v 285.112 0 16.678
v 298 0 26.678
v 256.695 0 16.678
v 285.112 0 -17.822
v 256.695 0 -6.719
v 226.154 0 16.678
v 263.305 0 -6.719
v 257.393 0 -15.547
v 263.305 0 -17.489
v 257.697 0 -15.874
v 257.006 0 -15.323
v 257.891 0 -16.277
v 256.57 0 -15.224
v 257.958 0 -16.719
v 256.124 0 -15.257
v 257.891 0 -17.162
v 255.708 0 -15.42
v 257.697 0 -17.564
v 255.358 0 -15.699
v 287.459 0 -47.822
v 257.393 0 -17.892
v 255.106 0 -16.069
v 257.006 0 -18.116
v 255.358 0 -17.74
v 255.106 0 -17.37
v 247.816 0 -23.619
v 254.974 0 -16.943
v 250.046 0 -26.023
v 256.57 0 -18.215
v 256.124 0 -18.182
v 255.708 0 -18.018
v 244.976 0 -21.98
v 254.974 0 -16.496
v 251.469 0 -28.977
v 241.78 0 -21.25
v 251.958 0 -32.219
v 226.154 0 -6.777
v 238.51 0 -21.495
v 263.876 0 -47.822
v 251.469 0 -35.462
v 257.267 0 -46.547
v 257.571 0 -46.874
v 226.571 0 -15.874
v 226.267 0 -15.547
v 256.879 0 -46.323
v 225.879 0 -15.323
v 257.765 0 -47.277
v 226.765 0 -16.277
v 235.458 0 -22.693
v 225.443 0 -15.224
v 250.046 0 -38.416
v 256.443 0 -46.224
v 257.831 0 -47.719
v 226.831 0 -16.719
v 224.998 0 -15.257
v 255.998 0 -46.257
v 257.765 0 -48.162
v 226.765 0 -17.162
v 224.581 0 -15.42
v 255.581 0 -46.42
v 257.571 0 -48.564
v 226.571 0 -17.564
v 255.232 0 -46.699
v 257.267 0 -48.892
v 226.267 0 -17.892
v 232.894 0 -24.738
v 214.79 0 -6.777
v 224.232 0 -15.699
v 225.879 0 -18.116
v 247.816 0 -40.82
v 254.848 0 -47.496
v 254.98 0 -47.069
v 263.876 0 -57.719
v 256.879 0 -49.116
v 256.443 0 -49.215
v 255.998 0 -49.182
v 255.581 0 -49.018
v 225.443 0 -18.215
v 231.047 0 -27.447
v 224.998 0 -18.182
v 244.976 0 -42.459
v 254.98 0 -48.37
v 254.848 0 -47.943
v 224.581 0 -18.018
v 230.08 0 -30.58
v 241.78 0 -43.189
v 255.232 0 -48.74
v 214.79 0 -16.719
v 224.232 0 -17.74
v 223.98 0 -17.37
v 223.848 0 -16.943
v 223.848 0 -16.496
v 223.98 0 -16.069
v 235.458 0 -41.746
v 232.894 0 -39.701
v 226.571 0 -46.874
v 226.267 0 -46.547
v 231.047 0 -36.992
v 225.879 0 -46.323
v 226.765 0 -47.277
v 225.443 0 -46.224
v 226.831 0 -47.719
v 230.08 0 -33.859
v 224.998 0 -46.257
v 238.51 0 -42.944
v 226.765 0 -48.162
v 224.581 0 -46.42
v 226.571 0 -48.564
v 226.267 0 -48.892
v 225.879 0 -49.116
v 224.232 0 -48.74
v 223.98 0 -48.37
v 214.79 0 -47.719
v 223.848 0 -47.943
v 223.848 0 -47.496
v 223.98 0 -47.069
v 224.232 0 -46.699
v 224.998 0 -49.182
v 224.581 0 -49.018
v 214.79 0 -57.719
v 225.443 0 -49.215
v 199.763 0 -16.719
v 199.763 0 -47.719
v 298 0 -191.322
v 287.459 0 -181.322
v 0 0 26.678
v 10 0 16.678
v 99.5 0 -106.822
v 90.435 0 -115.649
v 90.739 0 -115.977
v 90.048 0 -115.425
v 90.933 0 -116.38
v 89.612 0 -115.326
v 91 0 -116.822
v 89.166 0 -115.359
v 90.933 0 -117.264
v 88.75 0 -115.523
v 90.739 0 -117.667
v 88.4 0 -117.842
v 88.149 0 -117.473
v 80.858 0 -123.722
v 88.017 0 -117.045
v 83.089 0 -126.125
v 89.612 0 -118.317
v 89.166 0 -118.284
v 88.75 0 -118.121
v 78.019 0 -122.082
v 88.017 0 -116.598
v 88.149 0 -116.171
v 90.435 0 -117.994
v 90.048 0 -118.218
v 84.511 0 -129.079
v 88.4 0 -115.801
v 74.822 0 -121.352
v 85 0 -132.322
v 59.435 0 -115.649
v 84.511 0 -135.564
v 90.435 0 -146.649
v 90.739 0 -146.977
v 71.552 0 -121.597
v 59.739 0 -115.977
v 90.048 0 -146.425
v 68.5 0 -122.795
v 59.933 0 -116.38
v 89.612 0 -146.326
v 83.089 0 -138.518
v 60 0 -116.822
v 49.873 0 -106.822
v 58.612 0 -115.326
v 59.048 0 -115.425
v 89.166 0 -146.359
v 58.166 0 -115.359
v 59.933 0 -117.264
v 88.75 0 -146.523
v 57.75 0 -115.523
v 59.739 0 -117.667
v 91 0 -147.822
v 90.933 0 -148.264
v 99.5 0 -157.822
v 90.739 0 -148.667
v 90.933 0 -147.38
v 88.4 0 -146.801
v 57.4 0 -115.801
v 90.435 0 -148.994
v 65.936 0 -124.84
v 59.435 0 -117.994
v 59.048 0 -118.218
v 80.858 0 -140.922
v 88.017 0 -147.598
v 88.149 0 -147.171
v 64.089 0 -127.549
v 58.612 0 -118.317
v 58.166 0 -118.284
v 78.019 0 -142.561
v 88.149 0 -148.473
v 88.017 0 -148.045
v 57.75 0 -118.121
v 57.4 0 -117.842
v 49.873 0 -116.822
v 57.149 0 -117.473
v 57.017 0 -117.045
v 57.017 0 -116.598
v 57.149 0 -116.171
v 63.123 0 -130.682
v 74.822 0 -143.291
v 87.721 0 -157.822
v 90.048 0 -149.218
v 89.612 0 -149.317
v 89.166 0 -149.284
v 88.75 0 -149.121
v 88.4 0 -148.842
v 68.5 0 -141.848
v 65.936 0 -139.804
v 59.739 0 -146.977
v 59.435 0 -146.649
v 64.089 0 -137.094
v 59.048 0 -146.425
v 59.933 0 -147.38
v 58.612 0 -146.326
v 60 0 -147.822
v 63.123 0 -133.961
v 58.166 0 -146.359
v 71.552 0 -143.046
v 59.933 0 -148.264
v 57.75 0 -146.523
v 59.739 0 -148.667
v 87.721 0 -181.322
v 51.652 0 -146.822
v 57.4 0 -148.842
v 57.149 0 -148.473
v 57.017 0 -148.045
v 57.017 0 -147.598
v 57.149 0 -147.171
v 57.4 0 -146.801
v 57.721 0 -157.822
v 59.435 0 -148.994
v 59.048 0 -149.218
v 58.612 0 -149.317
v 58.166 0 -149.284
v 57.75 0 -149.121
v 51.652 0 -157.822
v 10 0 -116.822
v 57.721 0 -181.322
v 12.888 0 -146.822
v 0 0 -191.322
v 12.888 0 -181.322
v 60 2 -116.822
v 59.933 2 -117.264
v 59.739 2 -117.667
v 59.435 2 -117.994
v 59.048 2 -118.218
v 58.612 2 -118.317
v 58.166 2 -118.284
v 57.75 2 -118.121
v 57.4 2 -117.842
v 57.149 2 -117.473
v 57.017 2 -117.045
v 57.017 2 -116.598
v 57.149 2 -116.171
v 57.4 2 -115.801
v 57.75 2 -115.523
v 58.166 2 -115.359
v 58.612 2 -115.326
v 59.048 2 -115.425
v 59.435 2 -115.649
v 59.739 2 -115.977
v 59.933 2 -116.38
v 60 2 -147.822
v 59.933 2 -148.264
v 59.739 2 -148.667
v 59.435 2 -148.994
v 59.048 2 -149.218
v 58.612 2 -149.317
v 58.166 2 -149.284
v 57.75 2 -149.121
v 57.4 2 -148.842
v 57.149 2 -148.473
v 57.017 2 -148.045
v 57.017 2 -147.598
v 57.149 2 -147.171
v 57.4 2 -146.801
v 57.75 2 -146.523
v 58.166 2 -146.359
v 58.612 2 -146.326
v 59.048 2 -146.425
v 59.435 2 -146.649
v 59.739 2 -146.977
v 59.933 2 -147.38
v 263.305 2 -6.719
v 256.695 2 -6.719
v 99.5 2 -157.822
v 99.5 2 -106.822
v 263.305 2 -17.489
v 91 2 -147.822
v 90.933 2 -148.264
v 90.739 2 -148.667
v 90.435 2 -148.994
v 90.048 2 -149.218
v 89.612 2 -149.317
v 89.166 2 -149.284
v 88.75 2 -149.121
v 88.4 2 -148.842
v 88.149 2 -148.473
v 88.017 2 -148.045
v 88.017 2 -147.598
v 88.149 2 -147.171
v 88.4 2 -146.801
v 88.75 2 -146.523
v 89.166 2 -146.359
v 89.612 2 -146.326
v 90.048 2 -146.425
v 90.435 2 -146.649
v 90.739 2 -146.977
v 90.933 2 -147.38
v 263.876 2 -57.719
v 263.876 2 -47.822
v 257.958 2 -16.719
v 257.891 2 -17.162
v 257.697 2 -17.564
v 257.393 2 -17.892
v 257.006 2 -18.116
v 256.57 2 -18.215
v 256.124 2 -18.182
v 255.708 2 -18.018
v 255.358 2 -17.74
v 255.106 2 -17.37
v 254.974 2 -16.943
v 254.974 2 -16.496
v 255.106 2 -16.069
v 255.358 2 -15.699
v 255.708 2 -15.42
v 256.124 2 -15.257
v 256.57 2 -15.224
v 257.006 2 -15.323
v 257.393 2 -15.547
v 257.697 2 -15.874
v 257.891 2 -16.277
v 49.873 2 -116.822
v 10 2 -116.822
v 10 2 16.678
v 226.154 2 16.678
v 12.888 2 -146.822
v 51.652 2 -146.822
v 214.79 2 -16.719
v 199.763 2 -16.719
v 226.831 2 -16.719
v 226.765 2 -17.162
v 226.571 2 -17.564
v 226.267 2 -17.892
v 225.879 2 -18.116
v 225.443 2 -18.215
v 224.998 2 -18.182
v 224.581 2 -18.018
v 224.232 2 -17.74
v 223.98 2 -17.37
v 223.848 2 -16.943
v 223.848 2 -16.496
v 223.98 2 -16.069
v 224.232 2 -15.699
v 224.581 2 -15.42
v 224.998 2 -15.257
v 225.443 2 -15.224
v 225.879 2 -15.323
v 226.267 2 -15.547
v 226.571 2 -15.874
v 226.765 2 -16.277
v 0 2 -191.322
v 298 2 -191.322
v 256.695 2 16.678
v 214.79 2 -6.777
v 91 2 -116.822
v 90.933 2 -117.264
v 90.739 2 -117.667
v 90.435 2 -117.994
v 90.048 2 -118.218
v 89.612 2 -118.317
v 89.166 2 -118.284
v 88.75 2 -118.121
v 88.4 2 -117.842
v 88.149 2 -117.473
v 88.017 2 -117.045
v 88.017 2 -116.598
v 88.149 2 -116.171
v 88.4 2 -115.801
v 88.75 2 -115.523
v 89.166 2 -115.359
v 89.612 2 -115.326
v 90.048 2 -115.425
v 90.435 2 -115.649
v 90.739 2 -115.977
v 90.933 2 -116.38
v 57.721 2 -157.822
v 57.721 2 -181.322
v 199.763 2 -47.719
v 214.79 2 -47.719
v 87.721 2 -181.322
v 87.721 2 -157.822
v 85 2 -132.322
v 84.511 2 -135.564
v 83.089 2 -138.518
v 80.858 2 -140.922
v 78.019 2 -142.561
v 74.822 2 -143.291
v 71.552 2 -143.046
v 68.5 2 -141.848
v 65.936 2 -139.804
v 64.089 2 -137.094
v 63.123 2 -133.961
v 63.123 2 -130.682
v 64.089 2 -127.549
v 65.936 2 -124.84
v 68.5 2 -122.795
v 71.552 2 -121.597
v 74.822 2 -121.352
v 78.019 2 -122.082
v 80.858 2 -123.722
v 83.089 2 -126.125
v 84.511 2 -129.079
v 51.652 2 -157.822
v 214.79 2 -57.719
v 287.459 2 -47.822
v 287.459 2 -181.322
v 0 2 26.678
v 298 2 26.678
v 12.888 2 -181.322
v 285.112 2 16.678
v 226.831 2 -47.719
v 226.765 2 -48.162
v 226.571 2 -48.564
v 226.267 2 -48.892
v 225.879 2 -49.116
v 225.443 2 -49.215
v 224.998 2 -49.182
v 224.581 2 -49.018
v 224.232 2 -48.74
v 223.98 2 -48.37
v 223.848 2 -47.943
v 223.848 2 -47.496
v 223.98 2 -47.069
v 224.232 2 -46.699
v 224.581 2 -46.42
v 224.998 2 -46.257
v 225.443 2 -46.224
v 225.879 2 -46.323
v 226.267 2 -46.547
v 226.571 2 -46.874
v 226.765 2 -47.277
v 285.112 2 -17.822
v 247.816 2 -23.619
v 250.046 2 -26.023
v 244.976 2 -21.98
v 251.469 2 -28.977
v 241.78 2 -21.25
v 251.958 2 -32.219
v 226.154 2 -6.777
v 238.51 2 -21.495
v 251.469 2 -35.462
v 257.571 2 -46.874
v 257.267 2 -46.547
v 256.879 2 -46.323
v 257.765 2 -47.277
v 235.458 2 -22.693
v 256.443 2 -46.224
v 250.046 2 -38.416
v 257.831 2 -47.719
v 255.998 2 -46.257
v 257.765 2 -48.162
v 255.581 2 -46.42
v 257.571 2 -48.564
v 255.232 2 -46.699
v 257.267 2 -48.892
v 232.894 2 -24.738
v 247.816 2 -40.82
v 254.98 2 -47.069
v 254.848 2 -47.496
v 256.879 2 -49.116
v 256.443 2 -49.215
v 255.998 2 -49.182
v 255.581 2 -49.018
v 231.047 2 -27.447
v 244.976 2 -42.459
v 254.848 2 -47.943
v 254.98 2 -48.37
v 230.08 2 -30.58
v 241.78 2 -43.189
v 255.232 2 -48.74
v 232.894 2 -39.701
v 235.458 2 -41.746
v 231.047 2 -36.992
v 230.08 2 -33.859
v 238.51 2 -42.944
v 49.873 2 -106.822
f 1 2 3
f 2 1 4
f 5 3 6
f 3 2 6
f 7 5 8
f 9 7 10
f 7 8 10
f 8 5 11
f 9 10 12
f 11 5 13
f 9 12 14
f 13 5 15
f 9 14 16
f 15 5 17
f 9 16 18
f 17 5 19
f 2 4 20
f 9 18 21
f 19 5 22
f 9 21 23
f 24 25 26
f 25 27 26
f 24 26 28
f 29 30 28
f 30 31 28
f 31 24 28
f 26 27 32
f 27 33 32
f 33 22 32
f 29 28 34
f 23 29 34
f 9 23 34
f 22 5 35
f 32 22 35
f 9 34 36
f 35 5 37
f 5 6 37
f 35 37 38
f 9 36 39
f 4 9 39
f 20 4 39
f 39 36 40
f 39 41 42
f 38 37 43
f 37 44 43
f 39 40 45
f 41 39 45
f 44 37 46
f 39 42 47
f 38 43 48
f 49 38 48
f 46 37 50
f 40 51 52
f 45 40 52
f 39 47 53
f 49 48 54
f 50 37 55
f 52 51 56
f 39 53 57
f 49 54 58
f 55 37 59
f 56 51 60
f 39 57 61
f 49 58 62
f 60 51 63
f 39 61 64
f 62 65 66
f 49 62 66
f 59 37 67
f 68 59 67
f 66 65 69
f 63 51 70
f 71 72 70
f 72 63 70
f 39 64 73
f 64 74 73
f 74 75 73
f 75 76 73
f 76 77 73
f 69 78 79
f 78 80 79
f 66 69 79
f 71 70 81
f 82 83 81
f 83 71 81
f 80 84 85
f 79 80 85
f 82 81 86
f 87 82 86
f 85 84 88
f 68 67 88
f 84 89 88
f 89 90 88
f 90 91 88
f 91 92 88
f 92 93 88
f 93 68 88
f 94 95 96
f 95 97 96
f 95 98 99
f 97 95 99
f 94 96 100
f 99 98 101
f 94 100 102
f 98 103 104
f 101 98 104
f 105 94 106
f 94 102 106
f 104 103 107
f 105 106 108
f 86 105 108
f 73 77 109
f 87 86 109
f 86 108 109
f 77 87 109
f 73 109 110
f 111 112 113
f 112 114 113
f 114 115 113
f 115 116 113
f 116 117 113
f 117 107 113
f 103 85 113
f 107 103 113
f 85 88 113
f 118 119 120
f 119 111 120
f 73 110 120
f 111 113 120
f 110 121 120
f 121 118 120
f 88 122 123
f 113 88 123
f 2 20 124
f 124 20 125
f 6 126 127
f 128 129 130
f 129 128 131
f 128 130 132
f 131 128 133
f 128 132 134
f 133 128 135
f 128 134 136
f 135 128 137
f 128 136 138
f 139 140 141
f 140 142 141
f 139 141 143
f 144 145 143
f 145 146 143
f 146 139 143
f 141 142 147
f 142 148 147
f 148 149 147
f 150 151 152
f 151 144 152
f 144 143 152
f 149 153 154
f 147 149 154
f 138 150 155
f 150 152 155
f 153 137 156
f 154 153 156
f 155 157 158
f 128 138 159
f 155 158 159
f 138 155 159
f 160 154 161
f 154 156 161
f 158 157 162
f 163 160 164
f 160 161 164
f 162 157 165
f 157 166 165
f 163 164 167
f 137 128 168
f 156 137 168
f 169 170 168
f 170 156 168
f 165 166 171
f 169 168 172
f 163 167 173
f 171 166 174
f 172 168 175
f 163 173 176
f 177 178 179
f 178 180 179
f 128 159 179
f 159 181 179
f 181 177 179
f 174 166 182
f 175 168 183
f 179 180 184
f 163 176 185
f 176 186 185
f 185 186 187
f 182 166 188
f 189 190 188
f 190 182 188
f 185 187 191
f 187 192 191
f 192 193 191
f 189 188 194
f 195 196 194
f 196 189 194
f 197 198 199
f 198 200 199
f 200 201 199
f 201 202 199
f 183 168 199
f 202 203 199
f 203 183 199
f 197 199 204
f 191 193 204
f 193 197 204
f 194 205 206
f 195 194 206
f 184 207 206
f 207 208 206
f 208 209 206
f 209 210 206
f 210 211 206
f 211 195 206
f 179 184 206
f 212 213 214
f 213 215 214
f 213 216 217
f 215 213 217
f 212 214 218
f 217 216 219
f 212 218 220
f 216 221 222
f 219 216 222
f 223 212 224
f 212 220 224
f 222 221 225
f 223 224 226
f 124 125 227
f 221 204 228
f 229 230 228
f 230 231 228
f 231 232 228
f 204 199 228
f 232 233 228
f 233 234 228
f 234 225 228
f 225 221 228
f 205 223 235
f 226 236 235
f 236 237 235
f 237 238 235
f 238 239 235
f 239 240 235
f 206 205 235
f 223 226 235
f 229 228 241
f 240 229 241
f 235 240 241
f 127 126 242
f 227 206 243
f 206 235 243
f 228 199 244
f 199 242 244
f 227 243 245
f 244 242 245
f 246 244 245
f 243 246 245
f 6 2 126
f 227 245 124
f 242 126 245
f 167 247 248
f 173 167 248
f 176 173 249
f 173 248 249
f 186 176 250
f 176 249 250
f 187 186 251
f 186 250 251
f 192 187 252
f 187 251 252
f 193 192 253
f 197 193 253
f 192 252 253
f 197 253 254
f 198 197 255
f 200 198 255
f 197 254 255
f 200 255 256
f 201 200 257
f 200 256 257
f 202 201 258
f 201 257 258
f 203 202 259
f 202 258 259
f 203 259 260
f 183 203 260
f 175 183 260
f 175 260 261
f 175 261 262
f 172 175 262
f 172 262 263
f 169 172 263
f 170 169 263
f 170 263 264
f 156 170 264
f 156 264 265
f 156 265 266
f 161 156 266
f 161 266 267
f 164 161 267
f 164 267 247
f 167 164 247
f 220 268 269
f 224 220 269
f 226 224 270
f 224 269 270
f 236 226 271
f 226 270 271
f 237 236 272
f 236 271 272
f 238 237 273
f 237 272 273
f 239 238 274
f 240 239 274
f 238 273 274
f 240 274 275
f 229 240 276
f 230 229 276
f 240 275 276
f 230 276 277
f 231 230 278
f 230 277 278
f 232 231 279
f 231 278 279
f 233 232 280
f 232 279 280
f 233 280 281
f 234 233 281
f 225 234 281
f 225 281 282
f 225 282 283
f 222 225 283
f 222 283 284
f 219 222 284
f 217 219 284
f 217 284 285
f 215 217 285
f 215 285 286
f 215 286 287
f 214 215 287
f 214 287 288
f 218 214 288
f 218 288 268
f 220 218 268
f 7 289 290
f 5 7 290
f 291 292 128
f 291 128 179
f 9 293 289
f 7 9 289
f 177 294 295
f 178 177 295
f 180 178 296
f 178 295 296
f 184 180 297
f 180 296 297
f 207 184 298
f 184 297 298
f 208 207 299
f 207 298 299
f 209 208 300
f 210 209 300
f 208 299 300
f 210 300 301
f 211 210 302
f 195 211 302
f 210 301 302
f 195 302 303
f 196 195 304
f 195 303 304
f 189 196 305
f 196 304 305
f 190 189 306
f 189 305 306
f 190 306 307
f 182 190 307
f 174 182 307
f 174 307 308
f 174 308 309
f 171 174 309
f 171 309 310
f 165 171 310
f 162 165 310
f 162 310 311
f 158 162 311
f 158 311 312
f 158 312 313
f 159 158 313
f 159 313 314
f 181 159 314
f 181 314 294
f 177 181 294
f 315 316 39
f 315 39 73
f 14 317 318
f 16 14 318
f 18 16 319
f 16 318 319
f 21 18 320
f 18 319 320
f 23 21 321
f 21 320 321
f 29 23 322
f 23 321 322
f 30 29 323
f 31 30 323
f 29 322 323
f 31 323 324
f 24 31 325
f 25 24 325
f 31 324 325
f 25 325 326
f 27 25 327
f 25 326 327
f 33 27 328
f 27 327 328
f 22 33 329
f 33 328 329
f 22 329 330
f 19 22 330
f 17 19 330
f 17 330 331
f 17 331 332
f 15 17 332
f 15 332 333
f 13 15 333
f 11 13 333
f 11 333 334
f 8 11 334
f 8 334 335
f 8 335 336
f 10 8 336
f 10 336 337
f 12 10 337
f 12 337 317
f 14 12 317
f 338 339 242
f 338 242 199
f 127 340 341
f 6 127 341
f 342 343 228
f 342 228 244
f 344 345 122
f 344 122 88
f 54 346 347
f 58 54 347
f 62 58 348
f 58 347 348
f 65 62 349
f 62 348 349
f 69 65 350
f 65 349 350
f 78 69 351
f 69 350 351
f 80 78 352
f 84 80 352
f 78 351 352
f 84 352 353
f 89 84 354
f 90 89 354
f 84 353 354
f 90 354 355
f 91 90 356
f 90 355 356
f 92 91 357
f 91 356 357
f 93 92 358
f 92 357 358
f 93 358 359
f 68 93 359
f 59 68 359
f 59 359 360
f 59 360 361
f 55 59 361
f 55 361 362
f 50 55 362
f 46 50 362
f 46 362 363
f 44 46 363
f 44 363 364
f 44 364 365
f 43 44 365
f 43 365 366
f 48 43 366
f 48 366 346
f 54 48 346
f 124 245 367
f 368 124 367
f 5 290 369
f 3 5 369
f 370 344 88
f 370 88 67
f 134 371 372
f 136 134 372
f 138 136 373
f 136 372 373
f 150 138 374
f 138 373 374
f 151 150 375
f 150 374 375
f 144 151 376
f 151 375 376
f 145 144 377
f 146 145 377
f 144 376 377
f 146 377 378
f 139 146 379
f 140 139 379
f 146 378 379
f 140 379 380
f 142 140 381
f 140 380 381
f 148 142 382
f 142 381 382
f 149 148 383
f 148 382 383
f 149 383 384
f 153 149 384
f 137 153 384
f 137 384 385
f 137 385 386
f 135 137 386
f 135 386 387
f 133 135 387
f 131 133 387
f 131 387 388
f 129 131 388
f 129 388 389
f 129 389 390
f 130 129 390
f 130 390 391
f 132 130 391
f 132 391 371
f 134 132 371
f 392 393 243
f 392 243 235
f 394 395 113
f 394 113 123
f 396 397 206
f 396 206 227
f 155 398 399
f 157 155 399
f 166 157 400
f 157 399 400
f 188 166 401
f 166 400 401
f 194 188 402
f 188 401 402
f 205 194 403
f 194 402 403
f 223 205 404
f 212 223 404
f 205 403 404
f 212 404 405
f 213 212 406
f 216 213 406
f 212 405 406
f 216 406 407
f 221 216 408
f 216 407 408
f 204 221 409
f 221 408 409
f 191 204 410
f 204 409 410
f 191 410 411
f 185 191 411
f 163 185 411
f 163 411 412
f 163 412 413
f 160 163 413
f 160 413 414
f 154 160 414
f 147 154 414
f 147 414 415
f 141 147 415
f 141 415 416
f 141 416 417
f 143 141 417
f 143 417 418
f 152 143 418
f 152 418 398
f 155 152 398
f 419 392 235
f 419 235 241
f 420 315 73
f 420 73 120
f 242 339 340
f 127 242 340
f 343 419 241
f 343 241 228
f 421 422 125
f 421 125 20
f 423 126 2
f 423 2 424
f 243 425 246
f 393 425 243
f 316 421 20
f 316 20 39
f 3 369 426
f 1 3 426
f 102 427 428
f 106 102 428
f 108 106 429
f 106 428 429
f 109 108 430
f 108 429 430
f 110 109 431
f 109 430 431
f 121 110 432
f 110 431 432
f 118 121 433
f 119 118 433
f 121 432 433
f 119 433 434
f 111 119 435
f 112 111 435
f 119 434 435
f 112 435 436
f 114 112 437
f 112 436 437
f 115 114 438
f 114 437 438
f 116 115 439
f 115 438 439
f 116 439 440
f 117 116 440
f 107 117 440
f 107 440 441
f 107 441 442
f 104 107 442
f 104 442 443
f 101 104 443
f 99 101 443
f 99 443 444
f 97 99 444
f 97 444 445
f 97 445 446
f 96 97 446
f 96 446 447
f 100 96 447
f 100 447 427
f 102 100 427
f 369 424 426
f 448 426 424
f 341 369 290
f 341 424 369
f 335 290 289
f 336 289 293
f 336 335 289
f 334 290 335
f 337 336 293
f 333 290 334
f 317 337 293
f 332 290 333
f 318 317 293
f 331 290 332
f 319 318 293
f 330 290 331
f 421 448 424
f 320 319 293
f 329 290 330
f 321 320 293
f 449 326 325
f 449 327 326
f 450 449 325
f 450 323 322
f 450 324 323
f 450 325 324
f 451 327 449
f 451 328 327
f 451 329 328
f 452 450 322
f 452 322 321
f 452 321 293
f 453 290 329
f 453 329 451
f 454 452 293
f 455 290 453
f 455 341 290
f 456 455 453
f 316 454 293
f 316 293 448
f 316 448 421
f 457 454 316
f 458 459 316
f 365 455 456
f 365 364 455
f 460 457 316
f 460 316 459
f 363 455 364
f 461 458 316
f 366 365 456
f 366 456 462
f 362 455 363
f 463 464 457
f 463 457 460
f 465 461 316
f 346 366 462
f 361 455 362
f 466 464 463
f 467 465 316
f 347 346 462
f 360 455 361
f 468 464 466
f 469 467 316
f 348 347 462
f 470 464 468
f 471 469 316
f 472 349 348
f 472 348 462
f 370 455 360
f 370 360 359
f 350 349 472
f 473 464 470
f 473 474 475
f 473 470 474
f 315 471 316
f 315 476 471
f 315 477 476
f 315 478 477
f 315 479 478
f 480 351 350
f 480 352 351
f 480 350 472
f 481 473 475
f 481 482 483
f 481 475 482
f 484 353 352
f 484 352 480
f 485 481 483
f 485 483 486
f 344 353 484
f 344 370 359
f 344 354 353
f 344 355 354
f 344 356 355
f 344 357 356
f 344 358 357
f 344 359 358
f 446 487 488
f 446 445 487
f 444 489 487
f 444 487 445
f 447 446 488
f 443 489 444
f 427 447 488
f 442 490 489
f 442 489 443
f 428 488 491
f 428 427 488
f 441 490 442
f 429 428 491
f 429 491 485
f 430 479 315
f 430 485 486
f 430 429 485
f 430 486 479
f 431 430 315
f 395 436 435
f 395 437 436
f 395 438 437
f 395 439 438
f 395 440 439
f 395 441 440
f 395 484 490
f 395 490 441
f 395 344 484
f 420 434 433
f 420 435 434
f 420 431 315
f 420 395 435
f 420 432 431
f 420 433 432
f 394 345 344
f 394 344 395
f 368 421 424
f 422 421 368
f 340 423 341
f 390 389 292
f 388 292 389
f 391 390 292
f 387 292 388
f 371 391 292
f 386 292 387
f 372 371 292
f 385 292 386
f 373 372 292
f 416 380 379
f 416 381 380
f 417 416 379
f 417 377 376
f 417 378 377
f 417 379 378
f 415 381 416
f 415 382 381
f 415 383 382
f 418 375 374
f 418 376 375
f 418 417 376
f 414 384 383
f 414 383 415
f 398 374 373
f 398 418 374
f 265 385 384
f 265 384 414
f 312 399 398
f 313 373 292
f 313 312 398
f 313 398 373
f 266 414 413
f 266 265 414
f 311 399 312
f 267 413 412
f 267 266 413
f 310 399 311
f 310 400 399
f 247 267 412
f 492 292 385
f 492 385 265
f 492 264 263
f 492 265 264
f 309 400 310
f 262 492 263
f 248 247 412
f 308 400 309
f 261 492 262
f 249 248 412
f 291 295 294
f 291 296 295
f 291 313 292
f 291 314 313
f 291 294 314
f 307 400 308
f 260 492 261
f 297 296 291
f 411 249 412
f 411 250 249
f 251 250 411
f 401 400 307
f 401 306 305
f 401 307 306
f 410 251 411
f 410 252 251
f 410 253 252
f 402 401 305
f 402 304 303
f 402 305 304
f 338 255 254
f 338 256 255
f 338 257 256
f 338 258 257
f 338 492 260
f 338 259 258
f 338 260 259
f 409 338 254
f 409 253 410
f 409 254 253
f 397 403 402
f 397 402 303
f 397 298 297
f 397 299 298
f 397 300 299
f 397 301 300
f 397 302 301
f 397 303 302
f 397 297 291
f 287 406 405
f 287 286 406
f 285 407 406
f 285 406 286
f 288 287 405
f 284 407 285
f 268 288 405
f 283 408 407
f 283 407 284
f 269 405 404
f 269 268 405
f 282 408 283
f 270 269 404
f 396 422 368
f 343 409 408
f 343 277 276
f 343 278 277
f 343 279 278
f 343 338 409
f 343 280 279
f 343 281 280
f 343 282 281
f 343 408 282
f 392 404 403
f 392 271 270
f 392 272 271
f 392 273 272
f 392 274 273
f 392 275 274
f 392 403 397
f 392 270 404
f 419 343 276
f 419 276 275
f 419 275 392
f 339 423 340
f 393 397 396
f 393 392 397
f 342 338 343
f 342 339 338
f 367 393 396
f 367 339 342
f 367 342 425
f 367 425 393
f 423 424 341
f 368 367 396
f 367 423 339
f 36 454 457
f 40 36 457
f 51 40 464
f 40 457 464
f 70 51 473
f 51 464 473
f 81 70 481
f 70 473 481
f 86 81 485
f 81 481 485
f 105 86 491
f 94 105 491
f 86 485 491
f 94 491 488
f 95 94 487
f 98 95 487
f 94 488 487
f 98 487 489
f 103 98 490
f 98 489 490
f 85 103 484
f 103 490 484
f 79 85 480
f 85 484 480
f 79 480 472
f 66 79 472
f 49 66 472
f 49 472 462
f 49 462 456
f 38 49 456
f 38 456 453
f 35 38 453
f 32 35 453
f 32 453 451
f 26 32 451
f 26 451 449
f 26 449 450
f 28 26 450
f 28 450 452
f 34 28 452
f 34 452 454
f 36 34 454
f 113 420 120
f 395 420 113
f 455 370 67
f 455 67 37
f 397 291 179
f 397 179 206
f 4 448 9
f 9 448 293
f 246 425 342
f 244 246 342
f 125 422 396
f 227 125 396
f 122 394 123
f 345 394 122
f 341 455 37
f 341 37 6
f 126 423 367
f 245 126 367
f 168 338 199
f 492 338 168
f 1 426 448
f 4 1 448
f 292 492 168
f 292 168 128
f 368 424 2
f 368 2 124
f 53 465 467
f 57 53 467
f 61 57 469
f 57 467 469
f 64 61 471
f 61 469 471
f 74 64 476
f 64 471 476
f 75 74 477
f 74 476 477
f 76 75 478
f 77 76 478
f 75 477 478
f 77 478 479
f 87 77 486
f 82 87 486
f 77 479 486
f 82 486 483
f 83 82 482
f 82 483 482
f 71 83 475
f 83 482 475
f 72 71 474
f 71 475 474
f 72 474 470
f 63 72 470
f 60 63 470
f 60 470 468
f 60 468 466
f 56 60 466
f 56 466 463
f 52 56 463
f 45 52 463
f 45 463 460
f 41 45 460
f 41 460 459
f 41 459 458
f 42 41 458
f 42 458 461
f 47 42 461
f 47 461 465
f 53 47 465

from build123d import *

# Parameters (mm, degrees)
SKETCH1_W           = 218
SKETCH1_H           = 2
BOSS_EXTRUDE1_DEPTH = 298
SKETCH2_R           = 11
SKETCH2_R_2         = 1.5
CUT_EXTRUDE1_DEPTH  = 10


with BuildPart() as part:
    # Sketch1 → Boss-Extrude1 (new body)
    with BuildSketch(Plane(origin=(0, 0, 0), x_dir=(0, 0, -1), z_dir=(1, 0, 0))):
        with Locations((82.3216851, 1)):
            Rectangle(SKETCH1_W, SKETCH1_H)
    extrude(amount=BOSS_EXTRUDE1_DEPTH)

    # Sketch2 → Cut-Extrude1 (cut)
    with BuildSketch(Plane(origin=(0, 2, 0), x_dir=(1, 0, 0), z_dir=(0, 1, 0))):
        with Locations((74, 132.3216851)):
            Circle(SKETCH2_R)
        with Locations((89.5, 116.8216851)):
            Circle(SKETCH2_R_2)
        with Locations((58.5, 116.8216851)):
            Circle(SKETCH2_R_2)
        with Locations((89.5, 147.8216851)):
            Circle(SKETCH2_R_2)
        with Locations((58.5, 147.8216851)):
            Circle(SKETCH2_R_2)
        with Locations((256.33130124, 47.719426297)):
            Circle(SKETCH2_R_2)
        with Locations((256.457517214, 16.719426297)):
            Circle(SKETCH2_R_2)
        with Locations((225.33130124, 16.719426297)):
            Circle(SKETCH2_R_2)
        with Locations((225.33130124, 47.719426297)):
            Circle(SKETCH2_R_2)
        with Locations((240.957517214, 32.219426297)):
            Circle(SKETCH2_R)
        Polygon((12.887616176, 181.3216851), (57.721228679, 181.3216851), (57.721228679, 157.8216851), (51.65209525, 157.8216851), (51.65209525, 146.8216851), (12.887616176, 146.8216851), (12.887616176, 159.517007057), align=None)
        Polygon((149, -16.6783149), (104.471210326, -16.6783149), (10, -16.6783149), (10, 89.941809838), (10, 116.8216851), (49.873323929, 116.8216851), (49.873323929, 106.8216851), (99.5, 106.8216851), (99.5, 157.8216851), (87.721228679, 157.8216851), (87.721228679, 181.3216851), (101.200621078, 181.3216851), (149, 181.3216851), (287.459100292, 181.3216851), (287.459100292, 47.8216851), (263.876177895, 47.8216851), (263.876177895, 57.719426297), (214.790401532, 57.719426297), (214.790401532, 47.719426297), (199.762615123, 47.719426297), (199.762615123, 16.719426297), (214.790401532, 16.719426297), (214.790401532, 6.77711424), (226.154489119, 6.77711424), (226.154489119, -16.6783149), align=None)
        Polygon((285.112383824, -16.6783149), (285.112383824, 5.126363143), (285.112383824, 17.8216851), (263.305421964, 17.488619524), (263.305421964, 6.719426297), (256.695388827, 6.719426297), (256.695388827, -16.6783149), align=None)
    extrude(amount=-CUT_EXTRUDE1_DEPTH, mode=Mode.SUBTRACT)


solid = part.part
